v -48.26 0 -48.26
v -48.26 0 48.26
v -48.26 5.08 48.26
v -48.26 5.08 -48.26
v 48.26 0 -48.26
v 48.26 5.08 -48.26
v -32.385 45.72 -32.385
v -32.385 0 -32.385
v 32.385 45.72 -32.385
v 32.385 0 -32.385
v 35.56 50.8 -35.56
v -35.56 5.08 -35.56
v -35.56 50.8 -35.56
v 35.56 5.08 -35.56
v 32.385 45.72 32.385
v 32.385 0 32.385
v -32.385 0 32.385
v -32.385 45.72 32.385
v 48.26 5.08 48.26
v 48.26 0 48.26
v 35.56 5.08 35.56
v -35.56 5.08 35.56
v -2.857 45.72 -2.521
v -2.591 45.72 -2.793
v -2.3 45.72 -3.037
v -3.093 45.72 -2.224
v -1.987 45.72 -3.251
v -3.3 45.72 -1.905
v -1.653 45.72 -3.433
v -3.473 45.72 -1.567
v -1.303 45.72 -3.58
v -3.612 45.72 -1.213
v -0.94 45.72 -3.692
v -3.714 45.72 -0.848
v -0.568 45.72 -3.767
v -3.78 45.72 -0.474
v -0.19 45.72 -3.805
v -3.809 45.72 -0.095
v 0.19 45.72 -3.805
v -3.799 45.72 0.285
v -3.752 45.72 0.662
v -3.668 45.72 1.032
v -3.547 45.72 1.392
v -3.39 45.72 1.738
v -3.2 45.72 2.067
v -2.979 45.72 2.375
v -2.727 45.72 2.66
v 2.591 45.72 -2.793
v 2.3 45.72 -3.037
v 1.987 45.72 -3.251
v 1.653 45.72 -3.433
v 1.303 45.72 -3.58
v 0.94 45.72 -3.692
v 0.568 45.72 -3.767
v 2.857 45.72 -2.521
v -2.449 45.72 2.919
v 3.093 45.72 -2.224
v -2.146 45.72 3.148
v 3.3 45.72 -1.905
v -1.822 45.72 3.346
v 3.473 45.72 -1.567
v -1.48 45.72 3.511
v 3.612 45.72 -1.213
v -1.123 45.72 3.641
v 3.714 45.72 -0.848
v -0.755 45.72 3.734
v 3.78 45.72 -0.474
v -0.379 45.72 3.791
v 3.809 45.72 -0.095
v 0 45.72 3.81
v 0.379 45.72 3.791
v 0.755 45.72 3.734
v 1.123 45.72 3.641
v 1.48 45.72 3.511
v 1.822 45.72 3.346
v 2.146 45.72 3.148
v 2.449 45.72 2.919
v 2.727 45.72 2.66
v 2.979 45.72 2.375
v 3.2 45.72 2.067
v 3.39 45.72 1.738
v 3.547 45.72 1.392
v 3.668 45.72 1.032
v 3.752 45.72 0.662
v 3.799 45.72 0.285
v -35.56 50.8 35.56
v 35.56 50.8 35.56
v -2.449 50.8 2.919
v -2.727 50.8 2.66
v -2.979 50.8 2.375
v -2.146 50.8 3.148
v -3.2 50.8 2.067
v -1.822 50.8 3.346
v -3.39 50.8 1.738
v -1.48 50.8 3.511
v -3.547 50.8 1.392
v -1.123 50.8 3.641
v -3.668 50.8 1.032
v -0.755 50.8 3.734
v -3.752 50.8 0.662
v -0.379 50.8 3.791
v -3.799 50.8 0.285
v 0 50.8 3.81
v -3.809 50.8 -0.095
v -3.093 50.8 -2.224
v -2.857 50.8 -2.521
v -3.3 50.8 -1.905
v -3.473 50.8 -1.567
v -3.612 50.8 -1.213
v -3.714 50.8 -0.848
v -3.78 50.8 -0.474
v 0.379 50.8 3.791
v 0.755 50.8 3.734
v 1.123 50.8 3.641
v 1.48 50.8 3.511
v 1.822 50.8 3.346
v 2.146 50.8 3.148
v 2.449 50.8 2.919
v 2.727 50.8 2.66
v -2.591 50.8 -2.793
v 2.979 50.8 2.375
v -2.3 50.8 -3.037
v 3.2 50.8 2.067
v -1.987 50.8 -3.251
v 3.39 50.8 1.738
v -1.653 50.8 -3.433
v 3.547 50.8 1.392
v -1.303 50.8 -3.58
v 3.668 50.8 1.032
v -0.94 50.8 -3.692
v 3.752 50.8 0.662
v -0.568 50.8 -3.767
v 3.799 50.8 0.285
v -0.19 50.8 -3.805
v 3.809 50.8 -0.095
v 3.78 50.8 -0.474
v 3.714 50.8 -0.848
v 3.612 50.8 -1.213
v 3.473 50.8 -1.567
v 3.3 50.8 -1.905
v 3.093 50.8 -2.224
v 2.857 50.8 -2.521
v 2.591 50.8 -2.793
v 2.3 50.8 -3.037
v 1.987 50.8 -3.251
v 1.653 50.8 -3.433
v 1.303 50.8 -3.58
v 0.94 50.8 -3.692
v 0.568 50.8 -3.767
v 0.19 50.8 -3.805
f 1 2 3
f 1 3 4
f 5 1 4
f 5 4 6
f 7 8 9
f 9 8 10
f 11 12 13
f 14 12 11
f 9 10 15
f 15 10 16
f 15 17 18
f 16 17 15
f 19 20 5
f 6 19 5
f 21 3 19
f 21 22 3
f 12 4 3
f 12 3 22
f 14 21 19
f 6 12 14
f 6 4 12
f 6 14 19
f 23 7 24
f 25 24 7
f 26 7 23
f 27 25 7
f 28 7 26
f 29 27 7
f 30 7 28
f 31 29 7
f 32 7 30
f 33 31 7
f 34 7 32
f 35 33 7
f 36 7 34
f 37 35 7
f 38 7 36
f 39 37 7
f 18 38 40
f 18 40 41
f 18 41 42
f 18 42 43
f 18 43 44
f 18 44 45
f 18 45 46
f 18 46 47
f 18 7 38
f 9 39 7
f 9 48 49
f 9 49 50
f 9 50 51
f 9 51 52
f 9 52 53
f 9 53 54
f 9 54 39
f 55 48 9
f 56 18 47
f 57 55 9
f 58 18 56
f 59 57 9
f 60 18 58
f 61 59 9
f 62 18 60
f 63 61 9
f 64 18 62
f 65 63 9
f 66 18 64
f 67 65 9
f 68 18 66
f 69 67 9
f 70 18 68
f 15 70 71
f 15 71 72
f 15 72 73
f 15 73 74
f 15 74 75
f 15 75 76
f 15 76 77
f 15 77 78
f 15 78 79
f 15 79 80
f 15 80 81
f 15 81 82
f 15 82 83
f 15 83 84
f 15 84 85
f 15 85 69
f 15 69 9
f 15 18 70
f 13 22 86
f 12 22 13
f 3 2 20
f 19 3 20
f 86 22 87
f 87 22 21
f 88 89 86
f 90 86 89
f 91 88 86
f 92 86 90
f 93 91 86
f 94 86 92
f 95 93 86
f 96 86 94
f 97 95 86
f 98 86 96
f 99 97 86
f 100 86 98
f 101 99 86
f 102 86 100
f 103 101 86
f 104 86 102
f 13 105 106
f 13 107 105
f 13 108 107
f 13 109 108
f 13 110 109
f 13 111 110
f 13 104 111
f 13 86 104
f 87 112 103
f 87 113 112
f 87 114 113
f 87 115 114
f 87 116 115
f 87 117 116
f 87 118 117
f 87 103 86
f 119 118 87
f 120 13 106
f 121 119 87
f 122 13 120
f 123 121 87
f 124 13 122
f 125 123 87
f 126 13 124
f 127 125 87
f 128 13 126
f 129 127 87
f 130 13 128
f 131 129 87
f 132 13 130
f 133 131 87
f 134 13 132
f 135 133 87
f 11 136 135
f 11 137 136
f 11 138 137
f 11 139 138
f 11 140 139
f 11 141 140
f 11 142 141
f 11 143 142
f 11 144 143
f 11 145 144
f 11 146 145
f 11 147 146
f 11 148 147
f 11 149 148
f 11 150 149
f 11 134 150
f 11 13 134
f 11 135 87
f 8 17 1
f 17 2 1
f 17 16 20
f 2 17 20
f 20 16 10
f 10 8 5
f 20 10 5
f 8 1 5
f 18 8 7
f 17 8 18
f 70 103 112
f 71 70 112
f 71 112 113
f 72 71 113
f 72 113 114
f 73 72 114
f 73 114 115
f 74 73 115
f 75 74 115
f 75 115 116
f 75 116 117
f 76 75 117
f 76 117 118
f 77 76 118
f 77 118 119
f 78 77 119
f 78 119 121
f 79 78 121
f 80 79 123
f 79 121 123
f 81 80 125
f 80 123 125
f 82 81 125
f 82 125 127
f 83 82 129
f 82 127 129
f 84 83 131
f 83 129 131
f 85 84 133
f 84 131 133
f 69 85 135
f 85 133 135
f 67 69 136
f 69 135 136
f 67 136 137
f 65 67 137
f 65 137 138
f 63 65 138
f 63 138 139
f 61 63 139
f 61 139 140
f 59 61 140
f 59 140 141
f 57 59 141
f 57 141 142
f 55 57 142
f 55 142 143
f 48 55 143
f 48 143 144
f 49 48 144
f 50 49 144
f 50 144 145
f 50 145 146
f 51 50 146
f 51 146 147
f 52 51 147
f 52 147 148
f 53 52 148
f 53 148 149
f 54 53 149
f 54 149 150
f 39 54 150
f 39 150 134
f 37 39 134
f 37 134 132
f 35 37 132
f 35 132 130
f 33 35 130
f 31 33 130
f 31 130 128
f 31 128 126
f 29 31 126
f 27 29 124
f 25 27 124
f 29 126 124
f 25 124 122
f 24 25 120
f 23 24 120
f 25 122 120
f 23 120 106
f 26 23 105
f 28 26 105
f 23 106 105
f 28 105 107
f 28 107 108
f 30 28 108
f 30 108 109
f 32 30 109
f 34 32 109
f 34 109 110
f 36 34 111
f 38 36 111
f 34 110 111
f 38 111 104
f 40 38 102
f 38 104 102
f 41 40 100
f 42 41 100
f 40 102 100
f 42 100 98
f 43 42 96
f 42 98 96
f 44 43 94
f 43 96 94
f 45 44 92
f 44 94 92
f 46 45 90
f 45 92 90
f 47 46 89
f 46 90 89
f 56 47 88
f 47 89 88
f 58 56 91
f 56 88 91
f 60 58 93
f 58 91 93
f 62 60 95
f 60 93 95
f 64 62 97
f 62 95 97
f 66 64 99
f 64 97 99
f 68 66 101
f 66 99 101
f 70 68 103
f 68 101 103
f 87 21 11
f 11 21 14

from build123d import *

# Parameters (mm, degrees)
SKETCH1_W           = 71.12
SKETCH1_H           = 71.12
BOSS_EXTRUDE1_DEPTH = 50.8
SKETCH2_W           = 96.52
SKETCH2_H           = 96.52
BOSS_EXTRUDE2_DEPTH = 5.08
SKETCH3_W           = 64.77
SKETCH3_H           = 64.77
CUT_EXTRUDE1_DEPTH  = 45.72
SKETCH4_R           = 3.81
CUT_EXTRUDE2_DEPTH  = 86.08052186


with BuildPart() as part:
    # Sketch1 → Boss-Extrude1 (new body)
    with BuildSketch(Plane(origin=(0, 0, 0), x_dir=(1, 0, 0), z_dir=(0, 1, 0))):
        Rectangle(SKETCH1_W, SKETCH1_H)
    extrude(amount=BOSS_EXTRUDE1_DEPTH)

    # Sketch2 → Boss-Extrude2 (add)
    with BuildSketch(Plane(origin=(0, 0, 0), x_dir=(1, 0, 0), z_dir=(0, 1, 0))):
        Rectangle(SKETCH2_W, SKETCH2_H)
    extrude(amount=BOSS_EXTRUDE2_DEPTH)

    # Sketch3 → Cut-Extrude1 (cut)
    with BuildSketch(Plane.XZ):
        Rectangle(SKETCH3_W, SKETCH3_H)
    extrude(amount=-CUT_EXTRUDE1_DEPTH, mode=Mode.SUBTRACT)

    # Sketch4 → Cut-Extrude2 (cut, through all)
    with BuildSketch(Plane(origin=(0, 50.8, 0), x_dir=(1, 0, 0), z_dir=(0, 1, 0))):
        with Locations(Location((0, 0, 0), (0, 0, 270))):
            Circle(SKETCH4_R)
    extrude(amount=-CUT_EXTRUDE2_DEPTH, mode=Mode.SUBTRACT)


solid = part.part
